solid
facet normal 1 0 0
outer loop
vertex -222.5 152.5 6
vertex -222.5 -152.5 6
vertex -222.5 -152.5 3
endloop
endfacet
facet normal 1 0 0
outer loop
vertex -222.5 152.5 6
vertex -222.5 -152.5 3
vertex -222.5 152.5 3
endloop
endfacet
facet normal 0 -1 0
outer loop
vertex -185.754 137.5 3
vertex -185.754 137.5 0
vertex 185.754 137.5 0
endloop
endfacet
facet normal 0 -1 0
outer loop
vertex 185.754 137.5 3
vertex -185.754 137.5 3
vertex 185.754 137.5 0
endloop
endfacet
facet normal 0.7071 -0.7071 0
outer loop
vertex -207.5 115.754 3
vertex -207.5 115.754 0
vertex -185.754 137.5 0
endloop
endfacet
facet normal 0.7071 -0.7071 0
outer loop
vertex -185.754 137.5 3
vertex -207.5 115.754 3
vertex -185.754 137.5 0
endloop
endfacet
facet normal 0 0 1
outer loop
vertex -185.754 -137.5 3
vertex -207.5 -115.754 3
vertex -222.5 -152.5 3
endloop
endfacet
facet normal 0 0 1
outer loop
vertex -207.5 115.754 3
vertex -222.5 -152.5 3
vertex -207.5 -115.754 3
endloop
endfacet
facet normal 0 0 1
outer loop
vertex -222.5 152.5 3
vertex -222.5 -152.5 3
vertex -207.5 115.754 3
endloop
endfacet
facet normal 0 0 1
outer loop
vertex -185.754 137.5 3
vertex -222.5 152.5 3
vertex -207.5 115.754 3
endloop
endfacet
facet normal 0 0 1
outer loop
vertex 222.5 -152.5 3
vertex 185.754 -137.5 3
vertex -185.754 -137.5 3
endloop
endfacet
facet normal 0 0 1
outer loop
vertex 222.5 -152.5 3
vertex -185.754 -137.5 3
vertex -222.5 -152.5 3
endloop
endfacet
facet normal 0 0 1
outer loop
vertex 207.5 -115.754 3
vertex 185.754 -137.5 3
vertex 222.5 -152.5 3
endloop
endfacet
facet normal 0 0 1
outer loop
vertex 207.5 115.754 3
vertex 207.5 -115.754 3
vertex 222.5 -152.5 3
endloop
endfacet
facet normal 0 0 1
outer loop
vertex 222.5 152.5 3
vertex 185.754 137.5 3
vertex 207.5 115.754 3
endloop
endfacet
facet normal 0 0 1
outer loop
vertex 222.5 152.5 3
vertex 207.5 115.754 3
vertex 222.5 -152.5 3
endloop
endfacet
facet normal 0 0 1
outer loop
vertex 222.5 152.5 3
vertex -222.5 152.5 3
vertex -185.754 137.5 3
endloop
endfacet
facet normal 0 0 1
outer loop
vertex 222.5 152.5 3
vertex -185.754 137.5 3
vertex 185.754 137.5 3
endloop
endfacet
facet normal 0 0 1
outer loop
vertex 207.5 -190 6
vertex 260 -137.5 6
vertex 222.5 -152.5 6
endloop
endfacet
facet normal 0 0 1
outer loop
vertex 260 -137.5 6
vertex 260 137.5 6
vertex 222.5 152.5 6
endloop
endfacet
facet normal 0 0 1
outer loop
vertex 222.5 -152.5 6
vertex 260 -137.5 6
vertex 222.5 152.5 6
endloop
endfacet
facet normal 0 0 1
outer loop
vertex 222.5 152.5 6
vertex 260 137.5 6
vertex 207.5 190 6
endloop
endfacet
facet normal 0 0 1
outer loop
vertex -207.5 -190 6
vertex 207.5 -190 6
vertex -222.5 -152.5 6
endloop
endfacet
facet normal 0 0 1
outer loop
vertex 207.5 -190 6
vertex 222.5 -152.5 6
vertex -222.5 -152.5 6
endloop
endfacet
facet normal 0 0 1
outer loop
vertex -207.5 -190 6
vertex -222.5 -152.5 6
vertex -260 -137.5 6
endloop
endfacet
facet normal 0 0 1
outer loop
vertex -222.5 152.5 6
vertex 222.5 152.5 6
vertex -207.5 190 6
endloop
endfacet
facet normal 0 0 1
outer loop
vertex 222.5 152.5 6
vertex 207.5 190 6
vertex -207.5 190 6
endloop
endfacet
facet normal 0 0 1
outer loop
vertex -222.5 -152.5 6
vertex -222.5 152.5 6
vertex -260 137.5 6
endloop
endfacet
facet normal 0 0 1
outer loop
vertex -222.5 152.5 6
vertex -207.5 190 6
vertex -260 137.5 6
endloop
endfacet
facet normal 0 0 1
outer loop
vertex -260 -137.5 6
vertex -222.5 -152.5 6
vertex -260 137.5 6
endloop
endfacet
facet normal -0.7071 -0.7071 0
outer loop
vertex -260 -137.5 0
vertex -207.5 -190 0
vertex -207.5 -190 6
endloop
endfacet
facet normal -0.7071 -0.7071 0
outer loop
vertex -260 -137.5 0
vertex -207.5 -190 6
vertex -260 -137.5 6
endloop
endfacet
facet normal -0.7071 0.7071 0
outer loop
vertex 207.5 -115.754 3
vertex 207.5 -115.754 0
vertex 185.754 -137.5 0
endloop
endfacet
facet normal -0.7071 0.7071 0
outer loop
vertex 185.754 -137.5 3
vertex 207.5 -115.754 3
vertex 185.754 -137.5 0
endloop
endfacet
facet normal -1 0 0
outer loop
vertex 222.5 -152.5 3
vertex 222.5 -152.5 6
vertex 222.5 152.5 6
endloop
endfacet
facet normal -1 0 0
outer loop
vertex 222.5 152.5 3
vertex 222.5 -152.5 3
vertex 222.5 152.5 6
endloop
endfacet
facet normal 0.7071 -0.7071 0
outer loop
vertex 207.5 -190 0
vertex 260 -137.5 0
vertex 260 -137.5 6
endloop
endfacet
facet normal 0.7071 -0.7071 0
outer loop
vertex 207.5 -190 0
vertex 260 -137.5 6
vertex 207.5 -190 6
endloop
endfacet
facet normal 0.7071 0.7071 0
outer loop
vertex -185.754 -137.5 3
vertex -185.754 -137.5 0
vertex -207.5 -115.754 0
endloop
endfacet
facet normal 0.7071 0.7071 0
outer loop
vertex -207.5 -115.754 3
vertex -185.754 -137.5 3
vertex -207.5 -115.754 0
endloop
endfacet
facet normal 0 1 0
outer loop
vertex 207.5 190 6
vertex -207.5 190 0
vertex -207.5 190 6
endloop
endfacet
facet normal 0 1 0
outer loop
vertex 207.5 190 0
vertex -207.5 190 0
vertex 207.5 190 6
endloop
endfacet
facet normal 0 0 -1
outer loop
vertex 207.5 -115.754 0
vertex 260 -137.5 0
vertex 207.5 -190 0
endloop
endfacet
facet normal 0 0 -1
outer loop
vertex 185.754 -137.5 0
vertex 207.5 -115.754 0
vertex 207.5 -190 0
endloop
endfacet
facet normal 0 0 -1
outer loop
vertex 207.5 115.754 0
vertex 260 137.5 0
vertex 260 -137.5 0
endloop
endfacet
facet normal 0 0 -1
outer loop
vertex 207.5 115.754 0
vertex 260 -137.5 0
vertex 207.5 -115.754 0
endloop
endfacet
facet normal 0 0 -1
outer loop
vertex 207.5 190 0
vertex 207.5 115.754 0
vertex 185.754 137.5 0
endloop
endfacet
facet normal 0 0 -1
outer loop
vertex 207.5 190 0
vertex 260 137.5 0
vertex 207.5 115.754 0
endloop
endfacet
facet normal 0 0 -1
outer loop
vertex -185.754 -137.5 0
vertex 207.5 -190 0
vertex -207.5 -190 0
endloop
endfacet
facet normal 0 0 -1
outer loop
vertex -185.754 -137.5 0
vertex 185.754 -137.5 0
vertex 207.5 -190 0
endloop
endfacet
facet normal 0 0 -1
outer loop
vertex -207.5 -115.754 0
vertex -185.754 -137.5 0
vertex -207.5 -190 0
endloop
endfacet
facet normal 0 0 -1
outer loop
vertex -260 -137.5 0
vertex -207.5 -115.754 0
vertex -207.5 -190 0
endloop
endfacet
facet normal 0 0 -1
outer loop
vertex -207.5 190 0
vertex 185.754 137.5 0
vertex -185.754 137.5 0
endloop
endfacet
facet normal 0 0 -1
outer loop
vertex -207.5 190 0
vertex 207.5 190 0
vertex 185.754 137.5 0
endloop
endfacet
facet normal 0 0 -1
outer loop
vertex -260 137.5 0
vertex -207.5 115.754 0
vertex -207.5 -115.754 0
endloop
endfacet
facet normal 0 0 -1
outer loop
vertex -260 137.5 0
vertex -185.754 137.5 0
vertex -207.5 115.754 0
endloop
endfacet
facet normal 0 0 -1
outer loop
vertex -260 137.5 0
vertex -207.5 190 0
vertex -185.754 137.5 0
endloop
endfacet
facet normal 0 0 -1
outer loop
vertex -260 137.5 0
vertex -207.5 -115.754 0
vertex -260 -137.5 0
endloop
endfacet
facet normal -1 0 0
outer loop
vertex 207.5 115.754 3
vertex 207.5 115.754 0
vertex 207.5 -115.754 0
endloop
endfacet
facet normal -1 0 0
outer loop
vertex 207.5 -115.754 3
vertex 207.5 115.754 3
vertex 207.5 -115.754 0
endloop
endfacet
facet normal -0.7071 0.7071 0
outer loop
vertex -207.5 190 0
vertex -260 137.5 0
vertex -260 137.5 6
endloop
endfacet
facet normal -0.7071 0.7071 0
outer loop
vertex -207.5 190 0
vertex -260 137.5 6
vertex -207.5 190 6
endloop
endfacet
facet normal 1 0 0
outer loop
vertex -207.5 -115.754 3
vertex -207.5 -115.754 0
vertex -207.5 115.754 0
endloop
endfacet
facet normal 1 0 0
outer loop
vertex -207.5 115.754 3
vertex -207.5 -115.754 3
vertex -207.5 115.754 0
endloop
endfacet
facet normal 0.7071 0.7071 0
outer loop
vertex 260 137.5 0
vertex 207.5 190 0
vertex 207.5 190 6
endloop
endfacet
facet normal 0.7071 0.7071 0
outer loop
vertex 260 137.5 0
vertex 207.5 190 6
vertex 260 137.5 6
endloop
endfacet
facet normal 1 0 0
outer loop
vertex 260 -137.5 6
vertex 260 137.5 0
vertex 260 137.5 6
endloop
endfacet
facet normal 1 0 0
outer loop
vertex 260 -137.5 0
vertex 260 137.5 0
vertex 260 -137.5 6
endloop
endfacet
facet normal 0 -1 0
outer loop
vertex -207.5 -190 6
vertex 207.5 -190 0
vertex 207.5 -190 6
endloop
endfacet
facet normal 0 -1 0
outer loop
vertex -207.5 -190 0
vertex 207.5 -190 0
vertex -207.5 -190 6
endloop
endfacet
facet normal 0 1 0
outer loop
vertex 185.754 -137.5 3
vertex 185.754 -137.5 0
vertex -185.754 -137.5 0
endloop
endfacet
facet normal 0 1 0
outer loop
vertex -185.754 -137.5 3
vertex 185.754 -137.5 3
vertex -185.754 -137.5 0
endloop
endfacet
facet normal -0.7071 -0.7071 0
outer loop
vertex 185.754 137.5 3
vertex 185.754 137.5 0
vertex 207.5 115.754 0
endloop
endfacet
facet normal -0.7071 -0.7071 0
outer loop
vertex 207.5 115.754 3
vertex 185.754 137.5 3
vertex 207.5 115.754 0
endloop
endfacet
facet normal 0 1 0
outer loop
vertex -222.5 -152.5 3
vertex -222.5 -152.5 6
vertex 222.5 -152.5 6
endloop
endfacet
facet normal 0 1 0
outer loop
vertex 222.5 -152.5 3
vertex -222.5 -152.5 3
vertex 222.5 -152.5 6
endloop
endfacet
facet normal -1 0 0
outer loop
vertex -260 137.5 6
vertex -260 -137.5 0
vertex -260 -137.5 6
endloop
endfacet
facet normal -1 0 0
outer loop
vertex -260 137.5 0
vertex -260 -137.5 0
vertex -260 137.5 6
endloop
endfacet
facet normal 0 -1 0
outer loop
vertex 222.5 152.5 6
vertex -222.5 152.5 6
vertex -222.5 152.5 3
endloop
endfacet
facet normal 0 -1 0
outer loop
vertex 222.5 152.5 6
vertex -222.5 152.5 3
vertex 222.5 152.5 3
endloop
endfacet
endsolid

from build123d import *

# Parameters (mm, degrees)
PAD_DEPTH    = 6
SKETCH001_W  = 445
SKETCH001_H  = 305
POCKET_DEPTH = 3


with BuildPart() as part:
    # Sketch → Pad (new body)
    with BuildSketch(Plane.XY):
        Polygon((-207.5, 190), (207.5, 190), (260, 137.5), (260, -137.5), (207.5, -190), (-207.5, -190), (-260, -137.5), (-260, 137.5), align=None)
        Polygon((-207.5, -115.753788), (-207.5, 115.753788), (-185.753788, 137.5), (185.753788, 137.5), (207.5, 115.753788), (207.5, -115.753788), (185.753788, -137.5), (-185.753788, -137.5), align=None, mode=Mode.SUBTRACT)
    extrude(amount=PAD_DEPTH)

    # Sketch001 (on Face18 of Pad) → Pocket (cut)
    with BuildSketch(Plane.XY.offset(6)):
        Rectangle(SKETCH001_W, SKETCH001_H)
    extrude(amount=-POCKET_DEPTH, mode=Mode.SUBTRACT)


solid = part.part
